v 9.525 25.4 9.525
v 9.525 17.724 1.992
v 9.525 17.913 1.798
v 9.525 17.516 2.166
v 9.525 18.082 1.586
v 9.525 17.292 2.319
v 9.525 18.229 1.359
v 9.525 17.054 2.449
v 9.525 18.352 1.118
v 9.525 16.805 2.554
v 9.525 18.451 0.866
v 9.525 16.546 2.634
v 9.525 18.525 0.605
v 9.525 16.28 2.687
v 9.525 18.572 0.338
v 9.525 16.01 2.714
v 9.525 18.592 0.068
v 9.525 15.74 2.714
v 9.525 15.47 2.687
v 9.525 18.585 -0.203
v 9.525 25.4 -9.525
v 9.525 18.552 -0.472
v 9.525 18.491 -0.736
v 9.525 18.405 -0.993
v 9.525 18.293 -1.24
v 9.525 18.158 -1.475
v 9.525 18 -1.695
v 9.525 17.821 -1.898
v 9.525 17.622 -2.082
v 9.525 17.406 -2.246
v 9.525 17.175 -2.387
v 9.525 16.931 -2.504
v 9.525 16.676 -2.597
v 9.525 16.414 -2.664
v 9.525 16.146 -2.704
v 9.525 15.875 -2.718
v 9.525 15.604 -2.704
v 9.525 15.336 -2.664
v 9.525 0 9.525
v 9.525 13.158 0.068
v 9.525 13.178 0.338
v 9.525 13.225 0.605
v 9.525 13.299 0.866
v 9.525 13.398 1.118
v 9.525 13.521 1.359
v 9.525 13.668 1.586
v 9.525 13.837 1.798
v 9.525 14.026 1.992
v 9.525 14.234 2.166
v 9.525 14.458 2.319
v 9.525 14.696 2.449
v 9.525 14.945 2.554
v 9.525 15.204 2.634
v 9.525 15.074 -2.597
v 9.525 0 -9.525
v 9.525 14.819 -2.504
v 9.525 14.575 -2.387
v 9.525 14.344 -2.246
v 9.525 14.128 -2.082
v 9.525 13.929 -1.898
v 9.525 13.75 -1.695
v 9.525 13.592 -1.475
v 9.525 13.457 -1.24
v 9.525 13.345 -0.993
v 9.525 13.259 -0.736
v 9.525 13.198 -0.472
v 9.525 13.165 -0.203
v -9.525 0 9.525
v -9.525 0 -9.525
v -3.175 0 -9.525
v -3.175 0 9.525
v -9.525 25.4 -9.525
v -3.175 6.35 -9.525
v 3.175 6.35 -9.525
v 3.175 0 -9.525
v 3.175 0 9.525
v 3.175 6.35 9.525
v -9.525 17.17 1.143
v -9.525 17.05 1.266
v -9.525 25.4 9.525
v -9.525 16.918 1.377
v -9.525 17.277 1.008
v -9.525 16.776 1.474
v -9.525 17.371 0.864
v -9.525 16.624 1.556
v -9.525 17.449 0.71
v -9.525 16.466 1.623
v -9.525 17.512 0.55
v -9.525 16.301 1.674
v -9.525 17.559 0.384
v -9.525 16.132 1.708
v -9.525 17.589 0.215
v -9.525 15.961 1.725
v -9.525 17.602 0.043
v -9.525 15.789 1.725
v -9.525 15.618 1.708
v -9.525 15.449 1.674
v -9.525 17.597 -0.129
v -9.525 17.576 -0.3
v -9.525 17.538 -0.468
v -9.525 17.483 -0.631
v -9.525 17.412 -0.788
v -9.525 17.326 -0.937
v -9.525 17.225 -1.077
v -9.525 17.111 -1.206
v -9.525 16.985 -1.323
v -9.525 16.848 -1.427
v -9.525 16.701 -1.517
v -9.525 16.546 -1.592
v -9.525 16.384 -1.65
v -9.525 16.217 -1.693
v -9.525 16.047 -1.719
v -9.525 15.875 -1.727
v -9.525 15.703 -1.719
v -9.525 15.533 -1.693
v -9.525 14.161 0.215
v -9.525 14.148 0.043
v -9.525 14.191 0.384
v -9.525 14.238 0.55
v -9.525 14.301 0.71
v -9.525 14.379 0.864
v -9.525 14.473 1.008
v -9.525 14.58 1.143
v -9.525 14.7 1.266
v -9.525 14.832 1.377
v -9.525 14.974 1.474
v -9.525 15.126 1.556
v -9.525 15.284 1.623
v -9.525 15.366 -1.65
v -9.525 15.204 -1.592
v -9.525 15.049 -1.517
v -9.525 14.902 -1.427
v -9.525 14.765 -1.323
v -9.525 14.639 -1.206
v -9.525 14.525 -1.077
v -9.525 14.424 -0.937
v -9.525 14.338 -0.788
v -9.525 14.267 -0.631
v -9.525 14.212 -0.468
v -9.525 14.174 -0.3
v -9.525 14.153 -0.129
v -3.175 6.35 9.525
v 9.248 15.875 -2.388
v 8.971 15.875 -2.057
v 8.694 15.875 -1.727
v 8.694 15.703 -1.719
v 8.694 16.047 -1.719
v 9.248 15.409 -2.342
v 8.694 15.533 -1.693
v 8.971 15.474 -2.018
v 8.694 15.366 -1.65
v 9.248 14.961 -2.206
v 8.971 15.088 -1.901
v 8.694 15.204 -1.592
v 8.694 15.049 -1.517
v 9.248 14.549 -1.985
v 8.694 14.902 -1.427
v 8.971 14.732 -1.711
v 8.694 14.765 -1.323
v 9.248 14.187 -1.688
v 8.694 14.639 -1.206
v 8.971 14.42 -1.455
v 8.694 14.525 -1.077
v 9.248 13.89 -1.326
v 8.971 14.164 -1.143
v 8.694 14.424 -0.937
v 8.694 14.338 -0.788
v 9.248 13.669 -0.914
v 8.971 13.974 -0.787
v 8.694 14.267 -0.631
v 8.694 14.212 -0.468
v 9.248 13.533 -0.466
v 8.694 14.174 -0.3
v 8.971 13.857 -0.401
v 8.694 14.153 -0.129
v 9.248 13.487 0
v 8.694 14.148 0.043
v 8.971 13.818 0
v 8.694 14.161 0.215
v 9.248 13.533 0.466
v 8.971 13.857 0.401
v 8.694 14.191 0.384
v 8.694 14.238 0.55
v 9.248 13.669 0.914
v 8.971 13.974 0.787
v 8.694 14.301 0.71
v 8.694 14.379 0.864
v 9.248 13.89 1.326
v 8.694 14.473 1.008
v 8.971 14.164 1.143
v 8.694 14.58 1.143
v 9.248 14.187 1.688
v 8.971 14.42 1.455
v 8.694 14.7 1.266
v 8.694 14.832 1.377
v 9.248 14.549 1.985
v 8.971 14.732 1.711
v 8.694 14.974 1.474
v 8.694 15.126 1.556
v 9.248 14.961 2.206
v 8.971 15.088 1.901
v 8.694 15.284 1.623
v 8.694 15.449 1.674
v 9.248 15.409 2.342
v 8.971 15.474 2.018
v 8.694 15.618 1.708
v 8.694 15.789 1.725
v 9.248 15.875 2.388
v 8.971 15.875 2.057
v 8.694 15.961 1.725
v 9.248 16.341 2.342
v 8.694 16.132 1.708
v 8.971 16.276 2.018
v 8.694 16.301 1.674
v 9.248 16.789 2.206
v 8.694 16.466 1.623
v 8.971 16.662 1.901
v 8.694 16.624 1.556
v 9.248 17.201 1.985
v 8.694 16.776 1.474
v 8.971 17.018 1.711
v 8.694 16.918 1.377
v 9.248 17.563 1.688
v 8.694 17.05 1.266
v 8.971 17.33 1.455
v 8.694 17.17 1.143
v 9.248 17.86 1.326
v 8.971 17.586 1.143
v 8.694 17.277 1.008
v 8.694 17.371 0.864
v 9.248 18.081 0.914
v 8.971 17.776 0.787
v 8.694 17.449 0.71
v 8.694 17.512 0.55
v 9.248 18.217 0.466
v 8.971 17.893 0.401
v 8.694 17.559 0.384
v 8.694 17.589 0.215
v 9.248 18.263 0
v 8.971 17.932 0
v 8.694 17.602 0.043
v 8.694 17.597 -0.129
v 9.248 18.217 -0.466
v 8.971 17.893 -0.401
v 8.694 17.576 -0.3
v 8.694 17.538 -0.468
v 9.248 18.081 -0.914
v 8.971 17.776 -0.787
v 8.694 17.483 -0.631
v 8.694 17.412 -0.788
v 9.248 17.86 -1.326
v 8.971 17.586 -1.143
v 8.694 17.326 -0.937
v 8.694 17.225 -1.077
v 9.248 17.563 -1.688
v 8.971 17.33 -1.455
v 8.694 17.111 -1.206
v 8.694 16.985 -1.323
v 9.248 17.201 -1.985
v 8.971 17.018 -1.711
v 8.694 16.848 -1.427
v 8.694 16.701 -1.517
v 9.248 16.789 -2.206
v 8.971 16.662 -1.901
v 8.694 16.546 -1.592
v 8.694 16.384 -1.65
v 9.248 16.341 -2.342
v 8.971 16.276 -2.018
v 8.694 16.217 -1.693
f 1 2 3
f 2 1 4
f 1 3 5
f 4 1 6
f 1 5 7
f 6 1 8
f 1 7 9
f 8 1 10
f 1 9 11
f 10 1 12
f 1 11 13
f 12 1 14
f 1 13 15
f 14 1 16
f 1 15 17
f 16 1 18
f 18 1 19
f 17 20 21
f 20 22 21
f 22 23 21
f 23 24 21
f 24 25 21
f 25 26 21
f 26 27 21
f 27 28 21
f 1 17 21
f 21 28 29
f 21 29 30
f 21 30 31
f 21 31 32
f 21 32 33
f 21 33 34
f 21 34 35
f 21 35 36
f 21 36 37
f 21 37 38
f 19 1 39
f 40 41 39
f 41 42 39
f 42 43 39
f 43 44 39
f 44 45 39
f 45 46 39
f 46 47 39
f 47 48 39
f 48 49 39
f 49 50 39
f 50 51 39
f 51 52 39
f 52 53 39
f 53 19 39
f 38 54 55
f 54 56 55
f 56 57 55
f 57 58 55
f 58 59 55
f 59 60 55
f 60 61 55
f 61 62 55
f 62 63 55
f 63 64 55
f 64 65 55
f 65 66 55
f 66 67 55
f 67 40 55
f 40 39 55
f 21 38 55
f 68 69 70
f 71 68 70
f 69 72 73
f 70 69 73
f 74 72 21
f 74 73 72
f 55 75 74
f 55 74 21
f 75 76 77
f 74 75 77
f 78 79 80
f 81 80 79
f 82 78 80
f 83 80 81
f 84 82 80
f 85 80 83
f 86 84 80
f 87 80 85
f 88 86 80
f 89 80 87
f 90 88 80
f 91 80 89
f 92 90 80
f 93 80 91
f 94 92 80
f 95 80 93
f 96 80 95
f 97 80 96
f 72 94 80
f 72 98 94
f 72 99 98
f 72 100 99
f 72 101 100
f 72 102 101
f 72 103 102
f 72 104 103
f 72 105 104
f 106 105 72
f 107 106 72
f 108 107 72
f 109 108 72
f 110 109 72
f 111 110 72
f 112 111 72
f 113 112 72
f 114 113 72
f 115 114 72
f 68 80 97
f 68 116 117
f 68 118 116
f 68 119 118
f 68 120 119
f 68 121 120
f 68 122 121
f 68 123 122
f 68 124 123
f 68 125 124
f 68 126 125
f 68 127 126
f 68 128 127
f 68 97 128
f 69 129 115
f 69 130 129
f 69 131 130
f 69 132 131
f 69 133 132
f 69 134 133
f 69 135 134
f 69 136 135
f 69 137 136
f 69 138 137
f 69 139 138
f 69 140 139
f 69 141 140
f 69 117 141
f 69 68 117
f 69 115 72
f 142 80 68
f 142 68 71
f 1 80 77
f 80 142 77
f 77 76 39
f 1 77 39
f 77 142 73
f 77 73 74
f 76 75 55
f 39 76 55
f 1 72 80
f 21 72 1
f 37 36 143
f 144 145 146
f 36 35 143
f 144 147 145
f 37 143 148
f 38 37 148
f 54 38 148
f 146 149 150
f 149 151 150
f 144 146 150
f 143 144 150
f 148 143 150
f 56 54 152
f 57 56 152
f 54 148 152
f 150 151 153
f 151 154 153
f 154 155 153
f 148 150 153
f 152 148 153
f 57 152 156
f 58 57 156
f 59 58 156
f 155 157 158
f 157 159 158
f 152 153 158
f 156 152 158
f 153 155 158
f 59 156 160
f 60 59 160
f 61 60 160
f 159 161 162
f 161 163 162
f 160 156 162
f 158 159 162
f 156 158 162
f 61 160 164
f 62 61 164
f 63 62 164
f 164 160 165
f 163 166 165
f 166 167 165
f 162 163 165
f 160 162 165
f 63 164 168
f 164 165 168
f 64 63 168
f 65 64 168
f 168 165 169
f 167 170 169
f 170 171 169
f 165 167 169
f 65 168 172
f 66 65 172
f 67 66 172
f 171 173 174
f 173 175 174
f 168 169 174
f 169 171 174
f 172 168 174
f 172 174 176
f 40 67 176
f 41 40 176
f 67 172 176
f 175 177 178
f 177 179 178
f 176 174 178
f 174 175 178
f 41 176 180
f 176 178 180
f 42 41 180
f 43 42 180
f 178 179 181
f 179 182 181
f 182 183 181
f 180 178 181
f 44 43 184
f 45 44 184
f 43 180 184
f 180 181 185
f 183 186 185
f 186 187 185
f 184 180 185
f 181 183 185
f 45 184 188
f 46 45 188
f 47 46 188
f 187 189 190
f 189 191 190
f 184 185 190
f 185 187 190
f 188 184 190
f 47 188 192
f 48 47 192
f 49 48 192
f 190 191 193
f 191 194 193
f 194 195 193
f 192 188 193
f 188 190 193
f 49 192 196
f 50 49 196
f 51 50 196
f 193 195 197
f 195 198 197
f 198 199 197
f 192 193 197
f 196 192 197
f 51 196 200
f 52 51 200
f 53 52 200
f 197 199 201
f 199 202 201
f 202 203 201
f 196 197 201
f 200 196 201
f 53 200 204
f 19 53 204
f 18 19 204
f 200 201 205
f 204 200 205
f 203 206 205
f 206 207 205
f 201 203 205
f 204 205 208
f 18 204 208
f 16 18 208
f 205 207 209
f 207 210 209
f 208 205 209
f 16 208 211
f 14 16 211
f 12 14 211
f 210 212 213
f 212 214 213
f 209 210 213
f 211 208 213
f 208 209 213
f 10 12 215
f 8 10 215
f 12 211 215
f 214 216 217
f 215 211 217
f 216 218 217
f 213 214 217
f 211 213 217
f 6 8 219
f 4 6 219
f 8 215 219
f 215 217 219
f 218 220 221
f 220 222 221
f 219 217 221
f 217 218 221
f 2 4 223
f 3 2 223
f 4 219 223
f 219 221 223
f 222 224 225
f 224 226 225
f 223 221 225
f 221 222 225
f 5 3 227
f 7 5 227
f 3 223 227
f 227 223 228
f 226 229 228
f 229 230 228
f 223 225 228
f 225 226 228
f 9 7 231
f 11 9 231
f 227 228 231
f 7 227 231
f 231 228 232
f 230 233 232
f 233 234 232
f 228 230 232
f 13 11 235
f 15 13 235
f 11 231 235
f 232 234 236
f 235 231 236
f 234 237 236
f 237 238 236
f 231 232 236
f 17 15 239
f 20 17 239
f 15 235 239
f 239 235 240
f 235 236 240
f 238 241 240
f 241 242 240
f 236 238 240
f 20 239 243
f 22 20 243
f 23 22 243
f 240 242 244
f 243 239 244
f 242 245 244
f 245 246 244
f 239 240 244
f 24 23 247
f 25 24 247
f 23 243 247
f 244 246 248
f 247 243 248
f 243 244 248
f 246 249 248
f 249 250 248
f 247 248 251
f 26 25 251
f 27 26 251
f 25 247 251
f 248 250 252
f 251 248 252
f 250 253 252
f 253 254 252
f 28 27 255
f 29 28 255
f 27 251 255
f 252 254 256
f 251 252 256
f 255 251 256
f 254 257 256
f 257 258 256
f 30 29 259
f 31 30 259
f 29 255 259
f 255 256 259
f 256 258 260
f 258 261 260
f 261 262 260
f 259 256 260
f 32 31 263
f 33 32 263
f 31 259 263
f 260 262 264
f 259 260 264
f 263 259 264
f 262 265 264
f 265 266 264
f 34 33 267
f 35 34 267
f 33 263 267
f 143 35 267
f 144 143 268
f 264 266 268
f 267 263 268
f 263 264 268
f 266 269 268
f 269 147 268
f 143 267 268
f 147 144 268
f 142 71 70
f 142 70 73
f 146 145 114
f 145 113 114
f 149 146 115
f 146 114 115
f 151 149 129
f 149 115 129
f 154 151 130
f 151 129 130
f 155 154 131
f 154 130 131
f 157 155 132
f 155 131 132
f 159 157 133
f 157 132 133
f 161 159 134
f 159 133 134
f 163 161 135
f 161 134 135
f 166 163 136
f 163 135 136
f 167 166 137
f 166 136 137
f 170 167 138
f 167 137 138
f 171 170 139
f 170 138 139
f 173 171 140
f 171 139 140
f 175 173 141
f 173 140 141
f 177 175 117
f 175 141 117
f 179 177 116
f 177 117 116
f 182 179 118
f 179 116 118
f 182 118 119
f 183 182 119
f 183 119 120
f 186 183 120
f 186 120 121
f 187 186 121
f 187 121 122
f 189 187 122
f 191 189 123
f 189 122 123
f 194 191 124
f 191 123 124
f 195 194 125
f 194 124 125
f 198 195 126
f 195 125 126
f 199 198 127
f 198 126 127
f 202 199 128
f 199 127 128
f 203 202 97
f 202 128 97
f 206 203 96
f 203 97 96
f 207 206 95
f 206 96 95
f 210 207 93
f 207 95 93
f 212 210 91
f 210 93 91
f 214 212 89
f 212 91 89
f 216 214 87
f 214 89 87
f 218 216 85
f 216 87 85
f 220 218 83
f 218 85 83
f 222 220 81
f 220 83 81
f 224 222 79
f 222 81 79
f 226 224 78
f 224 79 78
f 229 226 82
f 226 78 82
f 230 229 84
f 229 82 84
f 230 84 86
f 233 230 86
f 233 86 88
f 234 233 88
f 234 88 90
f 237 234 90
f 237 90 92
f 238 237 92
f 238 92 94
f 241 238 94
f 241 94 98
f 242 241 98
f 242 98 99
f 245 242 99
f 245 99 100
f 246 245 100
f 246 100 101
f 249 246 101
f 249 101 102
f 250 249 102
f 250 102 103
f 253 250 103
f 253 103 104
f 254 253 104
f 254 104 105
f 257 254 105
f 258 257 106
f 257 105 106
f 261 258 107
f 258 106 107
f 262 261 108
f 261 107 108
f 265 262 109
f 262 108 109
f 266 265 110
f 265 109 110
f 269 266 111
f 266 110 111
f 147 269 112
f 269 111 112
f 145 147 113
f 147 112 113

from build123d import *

# Parameters (mm, degrees)
SKETCH1_W                       = 19.05
SKETCH1_H                       = 19.05
BOSS_EXTRUDE1_DEPTH             = 25.4
SKETCH2_W                       = 6.35
SKETCH2_H                       = 6.35
CUT_EXTRUDE1_DEPTH              = 20.05
F_8_32_TAPPED_HOLE1_D           = 3.4544
F_8_32_TAPPED_HOLE1_CSINK_D     = 5.4356
F_8_32_TAPPED_HOLE1_CSINK_ANGLE = 100


with BuildPart() as part:
    # Sketch1 → Boss-Extrude1 (new body)
    with BuildSketch(Plane(origin=(0, 0, 0), x_dir=(1, 0, 0), z_dir=(0, 1, 0))):
        Rectangle(SKETCH1_W, SKETCH1_H)
    extrude(amount=BOSS_EXTRUDE1_DEPTH)

    # Sketch2 → Cut-Extrude1 (cut, through all)
    with BuildSketch(Plane.XY.offset(9.525)):
        with Locations((0, 3.175)):
            Rectangle(SKETCH2_W, SKETCH2_H)
    extrude(amount=-CUT_EXTRUDE1_DEPTH, mode=Mode.SUBTRACT)

    # #8-32 Tapped Hole1 (through all)
    with Locations(Plane(origin=(9.525, 0, 0), x_dir=(0, 0, 1), z_dir=(1, 0, 0))):
        with Locations((0, -15.875)):
            CounterSinkHole(F_8_32_TAPPED_HOLE1_D / 2, F_8_32_TAPPED_HOLE1_CSINK_D / 2, counter_sink_angle=F_8_32_TAPPED_HOLE1_CSINK_ANGLE)


solid = part.part
